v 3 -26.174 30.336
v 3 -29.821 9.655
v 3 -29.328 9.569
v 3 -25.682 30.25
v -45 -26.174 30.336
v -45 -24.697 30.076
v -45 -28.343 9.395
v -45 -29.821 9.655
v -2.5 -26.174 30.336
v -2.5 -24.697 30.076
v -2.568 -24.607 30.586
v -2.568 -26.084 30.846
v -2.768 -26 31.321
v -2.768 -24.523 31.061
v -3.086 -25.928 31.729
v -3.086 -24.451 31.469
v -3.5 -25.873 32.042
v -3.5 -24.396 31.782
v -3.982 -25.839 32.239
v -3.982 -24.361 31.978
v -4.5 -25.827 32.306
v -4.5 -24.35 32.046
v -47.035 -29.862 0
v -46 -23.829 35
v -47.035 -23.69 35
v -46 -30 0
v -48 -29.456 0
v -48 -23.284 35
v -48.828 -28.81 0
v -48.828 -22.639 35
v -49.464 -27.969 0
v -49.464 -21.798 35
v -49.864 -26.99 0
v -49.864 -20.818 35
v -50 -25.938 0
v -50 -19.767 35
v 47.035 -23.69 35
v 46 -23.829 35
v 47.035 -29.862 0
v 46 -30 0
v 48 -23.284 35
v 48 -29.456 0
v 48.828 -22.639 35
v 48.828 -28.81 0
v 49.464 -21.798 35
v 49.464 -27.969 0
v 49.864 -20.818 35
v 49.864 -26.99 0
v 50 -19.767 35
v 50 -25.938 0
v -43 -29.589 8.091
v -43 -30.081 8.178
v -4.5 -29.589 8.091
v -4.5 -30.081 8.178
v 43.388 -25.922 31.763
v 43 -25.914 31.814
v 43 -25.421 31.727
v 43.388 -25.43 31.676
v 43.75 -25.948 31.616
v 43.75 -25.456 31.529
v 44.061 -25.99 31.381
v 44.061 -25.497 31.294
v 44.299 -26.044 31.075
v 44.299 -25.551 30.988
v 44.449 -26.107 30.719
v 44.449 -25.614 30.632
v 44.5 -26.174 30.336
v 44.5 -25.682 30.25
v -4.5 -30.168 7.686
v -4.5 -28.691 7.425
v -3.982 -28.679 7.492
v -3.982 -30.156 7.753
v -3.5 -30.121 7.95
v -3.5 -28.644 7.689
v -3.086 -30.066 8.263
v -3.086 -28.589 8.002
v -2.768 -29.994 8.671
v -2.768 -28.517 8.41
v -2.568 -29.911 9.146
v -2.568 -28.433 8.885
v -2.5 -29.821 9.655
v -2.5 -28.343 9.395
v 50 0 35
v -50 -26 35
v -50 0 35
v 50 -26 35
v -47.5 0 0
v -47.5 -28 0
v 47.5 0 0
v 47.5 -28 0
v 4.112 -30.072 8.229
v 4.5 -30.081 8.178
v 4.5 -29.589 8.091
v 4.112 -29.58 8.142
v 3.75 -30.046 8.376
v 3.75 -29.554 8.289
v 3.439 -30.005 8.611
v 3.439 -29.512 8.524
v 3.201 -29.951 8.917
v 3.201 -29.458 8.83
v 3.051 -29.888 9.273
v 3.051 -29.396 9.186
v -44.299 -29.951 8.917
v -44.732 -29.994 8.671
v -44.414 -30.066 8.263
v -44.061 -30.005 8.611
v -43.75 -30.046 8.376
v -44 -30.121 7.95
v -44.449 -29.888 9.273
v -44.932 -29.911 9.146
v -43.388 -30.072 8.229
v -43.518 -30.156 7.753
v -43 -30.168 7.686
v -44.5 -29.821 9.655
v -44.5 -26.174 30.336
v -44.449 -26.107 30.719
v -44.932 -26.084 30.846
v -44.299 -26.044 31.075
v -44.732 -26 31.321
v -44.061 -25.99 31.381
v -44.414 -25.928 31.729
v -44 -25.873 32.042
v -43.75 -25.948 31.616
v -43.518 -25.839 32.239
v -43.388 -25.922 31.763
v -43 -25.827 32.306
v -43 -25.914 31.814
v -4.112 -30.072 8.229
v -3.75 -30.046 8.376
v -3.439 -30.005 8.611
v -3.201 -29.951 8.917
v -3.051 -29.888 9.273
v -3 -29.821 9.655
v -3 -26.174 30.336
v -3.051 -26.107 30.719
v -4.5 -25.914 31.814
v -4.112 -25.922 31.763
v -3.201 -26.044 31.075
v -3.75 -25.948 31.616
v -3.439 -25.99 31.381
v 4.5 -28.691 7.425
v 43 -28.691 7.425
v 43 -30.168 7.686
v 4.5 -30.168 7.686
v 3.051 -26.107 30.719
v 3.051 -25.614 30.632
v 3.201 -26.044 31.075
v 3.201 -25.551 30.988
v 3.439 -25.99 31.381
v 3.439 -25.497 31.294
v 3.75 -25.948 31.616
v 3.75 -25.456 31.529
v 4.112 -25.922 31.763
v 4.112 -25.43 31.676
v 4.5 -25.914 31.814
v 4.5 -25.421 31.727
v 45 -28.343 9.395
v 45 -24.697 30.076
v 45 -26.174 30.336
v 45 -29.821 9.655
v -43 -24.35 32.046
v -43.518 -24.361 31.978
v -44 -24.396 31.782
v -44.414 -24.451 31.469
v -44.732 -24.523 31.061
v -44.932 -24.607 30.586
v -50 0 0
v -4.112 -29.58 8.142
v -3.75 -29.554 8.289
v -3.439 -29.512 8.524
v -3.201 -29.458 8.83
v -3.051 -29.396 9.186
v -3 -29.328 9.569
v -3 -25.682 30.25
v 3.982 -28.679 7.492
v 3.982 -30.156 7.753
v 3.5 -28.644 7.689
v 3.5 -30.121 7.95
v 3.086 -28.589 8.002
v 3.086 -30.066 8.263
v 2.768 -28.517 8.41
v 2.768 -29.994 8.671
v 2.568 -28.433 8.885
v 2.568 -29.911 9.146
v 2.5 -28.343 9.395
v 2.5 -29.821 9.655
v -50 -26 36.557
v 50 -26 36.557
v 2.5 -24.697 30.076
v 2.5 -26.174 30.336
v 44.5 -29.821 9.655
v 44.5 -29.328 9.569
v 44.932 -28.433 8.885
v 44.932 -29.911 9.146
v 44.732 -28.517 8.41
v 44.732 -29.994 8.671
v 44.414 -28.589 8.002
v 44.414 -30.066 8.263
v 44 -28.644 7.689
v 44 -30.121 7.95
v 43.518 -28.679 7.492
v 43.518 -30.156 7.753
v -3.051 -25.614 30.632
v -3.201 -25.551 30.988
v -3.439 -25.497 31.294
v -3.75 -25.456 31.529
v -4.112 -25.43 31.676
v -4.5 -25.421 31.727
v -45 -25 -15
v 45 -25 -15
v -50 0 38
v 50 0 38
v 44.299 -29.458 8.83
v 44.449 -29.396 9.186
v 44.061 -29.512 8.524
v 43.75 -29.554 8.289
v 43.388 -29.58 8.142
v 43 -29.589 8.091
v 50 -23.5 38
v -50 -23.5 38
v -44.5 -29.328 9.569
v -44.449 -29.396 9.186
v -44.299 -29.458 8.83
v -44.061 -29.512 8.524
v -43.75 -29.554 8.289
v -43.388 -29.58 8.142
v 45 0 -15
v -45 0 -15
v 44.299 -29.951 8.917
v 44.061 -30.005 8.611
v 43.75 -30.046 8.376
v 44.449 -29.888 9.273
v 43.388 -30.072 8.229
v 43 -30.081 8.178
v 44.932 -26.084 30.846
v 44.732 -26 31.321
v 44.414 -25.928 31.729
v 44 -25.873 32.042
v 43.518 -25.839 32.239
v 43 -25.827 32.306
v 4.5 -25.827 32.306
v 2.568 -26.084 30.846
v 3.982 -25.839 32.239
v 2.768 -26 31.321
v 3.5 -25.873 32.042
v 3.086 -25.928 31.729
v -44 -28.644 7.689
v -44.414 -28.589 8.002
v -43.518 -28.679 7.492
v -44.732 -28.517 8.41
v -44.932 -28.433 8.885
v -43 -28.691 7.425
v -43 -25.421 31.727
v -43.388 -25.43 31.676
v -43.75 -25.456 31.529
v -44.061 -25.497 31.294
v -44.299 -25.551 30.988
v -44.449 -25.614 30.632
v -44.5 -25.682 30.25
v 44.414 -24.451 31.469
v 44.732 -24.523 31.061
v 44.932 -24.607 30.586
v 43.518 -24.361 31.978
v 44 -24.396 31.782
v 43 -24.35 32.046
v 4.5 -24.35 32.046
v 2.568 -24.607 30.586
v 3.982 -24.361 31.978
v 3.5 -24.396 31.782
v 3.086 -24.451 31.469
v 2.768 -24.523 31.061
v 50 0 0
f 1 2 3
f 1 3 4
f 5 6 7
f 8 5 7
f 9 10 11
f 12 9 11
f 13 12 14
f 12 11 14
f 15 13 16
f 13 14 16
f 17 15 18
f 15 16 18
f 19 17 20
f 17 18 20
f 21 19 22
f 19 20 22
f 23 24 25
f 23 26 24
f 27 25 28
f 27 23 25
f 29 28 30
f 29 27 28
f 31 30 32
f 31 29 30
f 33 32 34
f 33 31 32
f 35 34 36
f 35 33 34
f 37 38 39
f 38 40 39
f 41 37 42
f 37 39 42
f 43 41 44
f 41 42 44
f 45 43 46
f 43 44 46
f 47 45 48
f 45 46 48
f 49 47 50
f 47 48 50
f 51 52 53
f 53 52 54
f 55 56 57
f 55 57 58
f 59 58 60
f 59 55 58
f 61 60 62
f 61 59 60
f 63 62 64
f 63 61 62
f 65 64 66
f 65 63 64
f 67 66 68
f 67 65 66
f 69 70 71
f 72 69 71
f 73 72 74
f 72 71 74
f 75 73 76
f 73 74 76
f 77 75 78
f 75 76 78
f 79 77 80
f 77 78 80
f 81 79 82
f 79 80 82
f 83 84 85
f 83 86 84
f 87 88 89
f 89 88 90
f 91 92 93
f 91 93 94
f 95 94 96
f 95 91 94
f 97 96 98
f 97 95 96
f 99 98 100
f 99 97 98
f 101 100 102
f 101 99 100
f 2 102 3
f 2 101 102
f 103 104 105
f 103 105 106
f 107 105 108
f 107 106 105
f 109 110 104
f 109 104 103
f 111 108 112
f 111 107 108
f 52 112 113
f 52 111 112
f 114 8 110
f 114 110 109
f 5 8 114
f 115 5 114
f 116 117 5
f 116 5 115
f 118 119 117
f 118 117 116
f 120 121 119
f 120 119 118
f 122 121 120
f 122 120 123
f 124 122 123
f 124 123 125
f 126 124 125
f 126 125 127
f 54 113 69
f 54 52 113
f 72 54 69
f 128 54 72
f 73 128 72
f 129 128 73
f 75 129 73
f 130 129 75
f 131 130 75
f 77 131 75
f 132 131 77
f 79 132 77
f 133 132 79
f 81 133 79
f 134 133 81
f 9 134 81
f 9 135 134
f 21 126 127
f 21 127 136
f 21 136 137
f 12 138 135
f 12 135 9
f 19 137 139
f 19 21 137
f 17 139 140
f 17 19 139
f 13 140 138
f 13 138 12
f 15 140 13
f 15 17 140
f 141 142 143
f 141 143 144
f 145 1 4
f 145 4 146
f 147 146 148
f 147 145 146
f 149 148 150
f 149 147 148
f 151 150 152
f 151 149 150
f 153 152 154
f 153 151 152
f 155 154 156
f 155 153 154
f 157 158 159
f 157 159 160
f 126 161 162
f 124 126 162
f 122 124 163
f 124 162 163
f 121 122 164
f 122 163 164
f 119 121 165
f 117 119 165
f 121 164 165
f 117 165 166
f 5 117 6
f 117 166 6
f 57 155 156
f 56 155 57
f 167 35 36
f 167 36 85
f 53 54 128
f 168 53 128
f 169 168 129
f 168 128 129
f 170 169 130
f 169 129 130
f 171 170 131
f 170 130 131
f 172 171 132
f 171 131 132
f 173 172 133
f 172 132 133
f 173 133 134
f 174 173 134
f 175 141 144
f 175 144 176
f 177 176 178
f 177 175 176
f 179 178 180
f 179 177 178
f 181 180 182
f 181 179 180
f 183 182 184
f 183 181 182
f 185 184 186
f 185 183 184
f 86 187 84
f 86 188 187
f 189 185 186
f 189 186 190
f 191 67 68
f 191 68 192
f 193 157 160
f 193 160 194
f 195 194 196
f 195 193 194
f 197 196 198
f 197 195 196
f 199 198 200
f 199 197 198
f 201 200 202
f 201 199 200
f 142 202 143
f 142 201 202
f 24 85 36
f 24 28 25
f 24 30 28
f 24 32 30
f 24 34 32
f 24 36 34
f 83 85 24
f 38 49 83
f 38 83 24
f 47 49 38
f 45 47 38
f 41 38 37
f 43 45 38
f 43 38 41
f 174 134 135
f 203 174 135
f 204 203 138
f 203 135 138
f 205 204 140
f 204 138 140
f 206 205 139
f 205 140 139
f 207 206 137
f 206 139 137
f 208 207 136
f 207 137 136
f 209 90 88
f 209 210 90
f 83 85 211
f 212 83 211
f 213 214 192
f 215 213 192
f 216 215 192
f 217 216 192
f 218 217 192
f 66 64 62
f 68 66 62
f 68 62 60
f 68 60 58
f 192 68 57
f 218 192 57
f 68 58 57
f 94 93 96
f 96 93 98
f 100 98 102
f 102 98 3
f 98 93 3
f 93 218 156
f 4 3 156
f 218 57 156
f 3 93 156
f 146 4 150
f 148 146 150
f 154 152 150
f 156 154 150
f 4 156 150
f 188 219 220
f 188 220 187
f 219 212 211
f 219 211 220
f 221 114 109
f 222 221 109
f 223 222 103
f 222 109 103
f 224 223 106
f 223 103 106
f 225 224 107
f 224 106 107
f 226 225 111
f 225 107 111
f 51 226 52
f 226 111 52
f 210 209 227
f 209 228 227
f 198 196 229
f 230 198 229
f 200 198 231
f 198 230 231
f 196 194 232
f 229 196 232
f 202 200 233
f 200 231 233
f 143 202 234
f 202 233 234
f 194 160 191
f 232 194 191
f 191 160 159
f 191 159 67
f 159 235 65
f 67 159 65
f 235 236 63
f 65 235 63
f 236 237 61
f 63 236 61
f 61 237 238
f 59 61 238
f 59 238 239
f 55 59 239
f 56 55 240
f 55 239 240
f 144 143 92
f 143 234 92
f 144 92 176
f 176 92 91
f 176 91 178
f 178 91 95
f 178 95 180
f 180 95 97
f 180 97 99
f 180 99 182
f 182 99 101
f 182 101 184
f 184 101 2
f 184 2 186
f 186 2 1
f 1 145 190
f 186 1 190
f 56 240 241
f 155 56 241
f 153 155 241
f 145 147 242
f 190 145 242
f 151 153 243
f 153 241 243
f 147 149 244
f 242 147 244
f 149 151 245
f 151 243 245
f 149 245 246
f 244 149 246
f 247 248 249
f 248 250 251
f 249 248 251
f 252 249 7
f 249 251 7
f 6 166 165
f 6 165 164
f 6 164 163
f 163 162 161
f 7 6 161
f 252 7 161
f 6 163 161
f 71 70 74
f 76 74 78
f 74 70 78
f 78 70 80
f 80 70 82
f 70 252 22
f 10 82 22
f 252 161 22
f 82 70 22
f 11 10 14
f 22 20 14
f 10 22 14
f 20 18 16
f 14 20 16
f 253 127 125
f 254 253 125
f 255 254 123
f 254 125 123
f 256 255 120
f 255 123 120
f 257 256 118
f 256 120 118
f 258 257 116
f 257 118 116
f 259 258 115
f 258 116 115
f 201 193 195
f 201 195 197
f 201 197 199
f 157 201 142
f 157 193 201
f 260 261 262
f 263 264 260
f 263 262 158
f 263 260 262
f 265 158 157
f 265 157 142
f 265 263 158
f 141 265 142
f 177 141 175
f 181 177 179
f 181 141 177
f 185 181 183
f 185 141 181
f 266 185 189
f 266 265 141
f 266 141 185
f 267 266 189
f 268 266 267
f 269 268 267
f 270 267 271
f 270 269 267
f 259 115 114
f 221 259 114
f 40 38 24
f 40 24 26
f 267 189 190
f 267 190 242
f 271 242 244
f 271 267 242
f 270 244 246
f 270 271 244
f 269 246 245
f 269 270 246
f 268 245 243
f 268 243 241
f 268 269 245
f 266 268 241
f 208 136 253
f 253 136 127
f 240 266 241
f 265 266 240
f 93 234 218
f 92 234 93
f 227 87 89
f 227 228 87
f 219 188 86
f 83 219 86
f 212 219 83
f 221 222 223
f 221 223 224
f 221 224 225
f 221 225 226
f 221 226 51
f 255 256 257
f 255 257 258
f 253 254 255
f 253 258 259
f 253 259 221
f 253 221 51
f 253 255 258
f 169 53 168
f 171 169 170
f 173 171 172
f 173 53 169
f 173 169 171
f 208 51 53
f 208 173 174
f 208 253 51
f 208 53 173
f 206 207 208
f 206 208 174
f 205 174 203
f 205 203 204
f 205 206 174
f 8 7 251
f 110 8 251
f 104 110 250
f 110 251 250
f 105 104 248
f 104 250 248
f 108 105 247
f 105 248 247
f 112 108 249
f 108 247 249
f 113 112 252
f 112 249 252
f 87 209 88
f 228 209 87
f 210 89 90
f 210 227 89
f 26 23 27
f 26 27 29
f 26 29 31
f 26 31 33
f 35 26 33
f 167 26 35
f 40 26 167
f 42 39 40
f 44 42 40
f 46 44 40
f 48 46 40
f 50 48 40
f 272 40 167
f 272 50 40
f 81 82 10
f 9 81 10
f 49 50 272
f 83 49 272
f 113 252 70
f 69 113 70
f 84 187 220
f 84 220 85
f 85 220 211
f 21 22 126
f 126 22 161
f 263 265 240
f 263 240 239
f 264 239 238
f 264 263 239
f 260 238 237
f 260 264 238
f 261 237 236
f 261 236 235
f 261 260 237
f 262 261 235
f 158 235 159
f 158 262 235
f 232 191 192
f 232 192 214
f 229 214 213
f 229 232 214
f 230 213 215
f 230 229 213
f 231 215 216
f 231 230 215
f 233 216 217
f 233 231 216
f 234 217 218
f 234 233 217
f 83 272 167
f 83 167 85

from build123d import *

# Parameters (mm, degrees)
F1_DEPTH  = 50
F3_DEPTH  = 50
F4_W      = 95
F4_H      = 28
F6_W      = 90
F6_H      = 25
F9_DEPTH  = 1.5
F11_DEPTH = 0.5
F13_R     = 4


with BuildPart() as f1:
    # F0 (on Right) → F1 (new body, symmetric)
    with BuildSketch(Plane.YZ):
        Polygon((-30, 0), (0, 0), (0, 35), (-23.828556, 35), align=None)
    extrude(amount=F1_DEPTH, both=True)

    # F13
    f13_edges = [f1.edges().sort_by_distance(p)[0] for p in [
        (-50, -26.914278, 17.5),
        (50, -26.914278, 17.5),
    ]]
    fillet(f13_edges, radius=F13_R)


with BuildPart() as f3:
    # F2 (on Right) → F3 (new body, symmetric)
    with BuildSketch(Plane.YZ):
        Polygon((0, 35), (0, 38), (-23.5, 38), (-26, 36.556624), (-26, 35), align=None)
    extrude(amount=F3_DEPTH, both=True)


with BuildPart() as f7:
    # F4 (on face) → F7 section 0
    with BuildSketch(Plane(origin=(0, 0, 0), x_dir=(1, 0, 0), z_dir=(0, 0, -1))):
        with Locations((0, 14)):
            Rectangle(F4_W, F4_H)
    # F6 (on offset) → F7 section 1
    with BuildSketch(Plane.XY.offset(-15)):
        with Locations((0, -12.5)):
            Rectangle(F6_W, F6_H)
    loft()


with BuildPart() as f9:
    # F8 (on face) → F9 (new body)
    with BuildSketch(Plane(origin=(0, -29.095389, 5.130302), x_dir=(1, 0, 0), z_dir=(0, -0.984808, 0.173648))):
        with BuildLine():
            Line((-4.5, 27.330486), (-43, 27.330486))
            ThreePointArc((-43, 27.330486), (-44.414214, 26.7447), (-45, 25.330486))
            Line((-45, 25.330486), (-45, 4.330486))
            ThreePointArc((-45, 4.330486), (-44.414214, 2.916273), (-43, 2.330486))
            Line((-43, 2.330486), (-4.5, 2.330486))
            ThreePointArc((-4.5, 2.330486), (-3.085786, 2.916273), (-2.5, 4.330486))
            Line((-2.5, 4.330486), (-2.5, 25.330486))
            ThreePointArc((-2.5, 25.330486), (-3.085786, 26.7447), (-4.5, 27.330486))
        make_face()
    extrude(amount=F9_DEPTH)

    # F10 (on face) → F11 (cut)
    with BuildSketch(Plane(origin=(0, -30.572601, 5.390774), x_dir=(1, 0, 0), z_dir=(0, -0.984808, 0.173648))):
        with BuildLine():
            ThreePointArc((-43, 26.830486), (-44.06066, 26.391146), (-44.5, 25.330486))
            Line((-44.5, 25.330486), (-44.5, 4.330486))
            ThreePointArc((-44.5, 4.330486), (-44.06066, 3.269826), (-43, 2.830486))
            Line((-43, 2.830486), (-4.5, 2.830486))
            ThreePointArc((-4.5, 2.830486), (-3.43934, 3.269826), (-3, 4.330486))
            Line((-3, 4.330486), (-3, 25.330486))
            ThreePointArc((-3, 25.330486), (-3.43934, 26.391146), (-4.5, 26.830486))
            Line((-4.5, 26.830486), (-43, 26.830486))
        make_face()
    extrude(amount=-F11_DEPTH, mode=Mode.SUBTRACT)


with BuildPart() as f12_1:
    # F12: instance of F9
    add(f9.part.mirror(Plane.YZ))


solid = Compound([f1.part, f3.part, f7.part, f9.part, f12_1.part])
